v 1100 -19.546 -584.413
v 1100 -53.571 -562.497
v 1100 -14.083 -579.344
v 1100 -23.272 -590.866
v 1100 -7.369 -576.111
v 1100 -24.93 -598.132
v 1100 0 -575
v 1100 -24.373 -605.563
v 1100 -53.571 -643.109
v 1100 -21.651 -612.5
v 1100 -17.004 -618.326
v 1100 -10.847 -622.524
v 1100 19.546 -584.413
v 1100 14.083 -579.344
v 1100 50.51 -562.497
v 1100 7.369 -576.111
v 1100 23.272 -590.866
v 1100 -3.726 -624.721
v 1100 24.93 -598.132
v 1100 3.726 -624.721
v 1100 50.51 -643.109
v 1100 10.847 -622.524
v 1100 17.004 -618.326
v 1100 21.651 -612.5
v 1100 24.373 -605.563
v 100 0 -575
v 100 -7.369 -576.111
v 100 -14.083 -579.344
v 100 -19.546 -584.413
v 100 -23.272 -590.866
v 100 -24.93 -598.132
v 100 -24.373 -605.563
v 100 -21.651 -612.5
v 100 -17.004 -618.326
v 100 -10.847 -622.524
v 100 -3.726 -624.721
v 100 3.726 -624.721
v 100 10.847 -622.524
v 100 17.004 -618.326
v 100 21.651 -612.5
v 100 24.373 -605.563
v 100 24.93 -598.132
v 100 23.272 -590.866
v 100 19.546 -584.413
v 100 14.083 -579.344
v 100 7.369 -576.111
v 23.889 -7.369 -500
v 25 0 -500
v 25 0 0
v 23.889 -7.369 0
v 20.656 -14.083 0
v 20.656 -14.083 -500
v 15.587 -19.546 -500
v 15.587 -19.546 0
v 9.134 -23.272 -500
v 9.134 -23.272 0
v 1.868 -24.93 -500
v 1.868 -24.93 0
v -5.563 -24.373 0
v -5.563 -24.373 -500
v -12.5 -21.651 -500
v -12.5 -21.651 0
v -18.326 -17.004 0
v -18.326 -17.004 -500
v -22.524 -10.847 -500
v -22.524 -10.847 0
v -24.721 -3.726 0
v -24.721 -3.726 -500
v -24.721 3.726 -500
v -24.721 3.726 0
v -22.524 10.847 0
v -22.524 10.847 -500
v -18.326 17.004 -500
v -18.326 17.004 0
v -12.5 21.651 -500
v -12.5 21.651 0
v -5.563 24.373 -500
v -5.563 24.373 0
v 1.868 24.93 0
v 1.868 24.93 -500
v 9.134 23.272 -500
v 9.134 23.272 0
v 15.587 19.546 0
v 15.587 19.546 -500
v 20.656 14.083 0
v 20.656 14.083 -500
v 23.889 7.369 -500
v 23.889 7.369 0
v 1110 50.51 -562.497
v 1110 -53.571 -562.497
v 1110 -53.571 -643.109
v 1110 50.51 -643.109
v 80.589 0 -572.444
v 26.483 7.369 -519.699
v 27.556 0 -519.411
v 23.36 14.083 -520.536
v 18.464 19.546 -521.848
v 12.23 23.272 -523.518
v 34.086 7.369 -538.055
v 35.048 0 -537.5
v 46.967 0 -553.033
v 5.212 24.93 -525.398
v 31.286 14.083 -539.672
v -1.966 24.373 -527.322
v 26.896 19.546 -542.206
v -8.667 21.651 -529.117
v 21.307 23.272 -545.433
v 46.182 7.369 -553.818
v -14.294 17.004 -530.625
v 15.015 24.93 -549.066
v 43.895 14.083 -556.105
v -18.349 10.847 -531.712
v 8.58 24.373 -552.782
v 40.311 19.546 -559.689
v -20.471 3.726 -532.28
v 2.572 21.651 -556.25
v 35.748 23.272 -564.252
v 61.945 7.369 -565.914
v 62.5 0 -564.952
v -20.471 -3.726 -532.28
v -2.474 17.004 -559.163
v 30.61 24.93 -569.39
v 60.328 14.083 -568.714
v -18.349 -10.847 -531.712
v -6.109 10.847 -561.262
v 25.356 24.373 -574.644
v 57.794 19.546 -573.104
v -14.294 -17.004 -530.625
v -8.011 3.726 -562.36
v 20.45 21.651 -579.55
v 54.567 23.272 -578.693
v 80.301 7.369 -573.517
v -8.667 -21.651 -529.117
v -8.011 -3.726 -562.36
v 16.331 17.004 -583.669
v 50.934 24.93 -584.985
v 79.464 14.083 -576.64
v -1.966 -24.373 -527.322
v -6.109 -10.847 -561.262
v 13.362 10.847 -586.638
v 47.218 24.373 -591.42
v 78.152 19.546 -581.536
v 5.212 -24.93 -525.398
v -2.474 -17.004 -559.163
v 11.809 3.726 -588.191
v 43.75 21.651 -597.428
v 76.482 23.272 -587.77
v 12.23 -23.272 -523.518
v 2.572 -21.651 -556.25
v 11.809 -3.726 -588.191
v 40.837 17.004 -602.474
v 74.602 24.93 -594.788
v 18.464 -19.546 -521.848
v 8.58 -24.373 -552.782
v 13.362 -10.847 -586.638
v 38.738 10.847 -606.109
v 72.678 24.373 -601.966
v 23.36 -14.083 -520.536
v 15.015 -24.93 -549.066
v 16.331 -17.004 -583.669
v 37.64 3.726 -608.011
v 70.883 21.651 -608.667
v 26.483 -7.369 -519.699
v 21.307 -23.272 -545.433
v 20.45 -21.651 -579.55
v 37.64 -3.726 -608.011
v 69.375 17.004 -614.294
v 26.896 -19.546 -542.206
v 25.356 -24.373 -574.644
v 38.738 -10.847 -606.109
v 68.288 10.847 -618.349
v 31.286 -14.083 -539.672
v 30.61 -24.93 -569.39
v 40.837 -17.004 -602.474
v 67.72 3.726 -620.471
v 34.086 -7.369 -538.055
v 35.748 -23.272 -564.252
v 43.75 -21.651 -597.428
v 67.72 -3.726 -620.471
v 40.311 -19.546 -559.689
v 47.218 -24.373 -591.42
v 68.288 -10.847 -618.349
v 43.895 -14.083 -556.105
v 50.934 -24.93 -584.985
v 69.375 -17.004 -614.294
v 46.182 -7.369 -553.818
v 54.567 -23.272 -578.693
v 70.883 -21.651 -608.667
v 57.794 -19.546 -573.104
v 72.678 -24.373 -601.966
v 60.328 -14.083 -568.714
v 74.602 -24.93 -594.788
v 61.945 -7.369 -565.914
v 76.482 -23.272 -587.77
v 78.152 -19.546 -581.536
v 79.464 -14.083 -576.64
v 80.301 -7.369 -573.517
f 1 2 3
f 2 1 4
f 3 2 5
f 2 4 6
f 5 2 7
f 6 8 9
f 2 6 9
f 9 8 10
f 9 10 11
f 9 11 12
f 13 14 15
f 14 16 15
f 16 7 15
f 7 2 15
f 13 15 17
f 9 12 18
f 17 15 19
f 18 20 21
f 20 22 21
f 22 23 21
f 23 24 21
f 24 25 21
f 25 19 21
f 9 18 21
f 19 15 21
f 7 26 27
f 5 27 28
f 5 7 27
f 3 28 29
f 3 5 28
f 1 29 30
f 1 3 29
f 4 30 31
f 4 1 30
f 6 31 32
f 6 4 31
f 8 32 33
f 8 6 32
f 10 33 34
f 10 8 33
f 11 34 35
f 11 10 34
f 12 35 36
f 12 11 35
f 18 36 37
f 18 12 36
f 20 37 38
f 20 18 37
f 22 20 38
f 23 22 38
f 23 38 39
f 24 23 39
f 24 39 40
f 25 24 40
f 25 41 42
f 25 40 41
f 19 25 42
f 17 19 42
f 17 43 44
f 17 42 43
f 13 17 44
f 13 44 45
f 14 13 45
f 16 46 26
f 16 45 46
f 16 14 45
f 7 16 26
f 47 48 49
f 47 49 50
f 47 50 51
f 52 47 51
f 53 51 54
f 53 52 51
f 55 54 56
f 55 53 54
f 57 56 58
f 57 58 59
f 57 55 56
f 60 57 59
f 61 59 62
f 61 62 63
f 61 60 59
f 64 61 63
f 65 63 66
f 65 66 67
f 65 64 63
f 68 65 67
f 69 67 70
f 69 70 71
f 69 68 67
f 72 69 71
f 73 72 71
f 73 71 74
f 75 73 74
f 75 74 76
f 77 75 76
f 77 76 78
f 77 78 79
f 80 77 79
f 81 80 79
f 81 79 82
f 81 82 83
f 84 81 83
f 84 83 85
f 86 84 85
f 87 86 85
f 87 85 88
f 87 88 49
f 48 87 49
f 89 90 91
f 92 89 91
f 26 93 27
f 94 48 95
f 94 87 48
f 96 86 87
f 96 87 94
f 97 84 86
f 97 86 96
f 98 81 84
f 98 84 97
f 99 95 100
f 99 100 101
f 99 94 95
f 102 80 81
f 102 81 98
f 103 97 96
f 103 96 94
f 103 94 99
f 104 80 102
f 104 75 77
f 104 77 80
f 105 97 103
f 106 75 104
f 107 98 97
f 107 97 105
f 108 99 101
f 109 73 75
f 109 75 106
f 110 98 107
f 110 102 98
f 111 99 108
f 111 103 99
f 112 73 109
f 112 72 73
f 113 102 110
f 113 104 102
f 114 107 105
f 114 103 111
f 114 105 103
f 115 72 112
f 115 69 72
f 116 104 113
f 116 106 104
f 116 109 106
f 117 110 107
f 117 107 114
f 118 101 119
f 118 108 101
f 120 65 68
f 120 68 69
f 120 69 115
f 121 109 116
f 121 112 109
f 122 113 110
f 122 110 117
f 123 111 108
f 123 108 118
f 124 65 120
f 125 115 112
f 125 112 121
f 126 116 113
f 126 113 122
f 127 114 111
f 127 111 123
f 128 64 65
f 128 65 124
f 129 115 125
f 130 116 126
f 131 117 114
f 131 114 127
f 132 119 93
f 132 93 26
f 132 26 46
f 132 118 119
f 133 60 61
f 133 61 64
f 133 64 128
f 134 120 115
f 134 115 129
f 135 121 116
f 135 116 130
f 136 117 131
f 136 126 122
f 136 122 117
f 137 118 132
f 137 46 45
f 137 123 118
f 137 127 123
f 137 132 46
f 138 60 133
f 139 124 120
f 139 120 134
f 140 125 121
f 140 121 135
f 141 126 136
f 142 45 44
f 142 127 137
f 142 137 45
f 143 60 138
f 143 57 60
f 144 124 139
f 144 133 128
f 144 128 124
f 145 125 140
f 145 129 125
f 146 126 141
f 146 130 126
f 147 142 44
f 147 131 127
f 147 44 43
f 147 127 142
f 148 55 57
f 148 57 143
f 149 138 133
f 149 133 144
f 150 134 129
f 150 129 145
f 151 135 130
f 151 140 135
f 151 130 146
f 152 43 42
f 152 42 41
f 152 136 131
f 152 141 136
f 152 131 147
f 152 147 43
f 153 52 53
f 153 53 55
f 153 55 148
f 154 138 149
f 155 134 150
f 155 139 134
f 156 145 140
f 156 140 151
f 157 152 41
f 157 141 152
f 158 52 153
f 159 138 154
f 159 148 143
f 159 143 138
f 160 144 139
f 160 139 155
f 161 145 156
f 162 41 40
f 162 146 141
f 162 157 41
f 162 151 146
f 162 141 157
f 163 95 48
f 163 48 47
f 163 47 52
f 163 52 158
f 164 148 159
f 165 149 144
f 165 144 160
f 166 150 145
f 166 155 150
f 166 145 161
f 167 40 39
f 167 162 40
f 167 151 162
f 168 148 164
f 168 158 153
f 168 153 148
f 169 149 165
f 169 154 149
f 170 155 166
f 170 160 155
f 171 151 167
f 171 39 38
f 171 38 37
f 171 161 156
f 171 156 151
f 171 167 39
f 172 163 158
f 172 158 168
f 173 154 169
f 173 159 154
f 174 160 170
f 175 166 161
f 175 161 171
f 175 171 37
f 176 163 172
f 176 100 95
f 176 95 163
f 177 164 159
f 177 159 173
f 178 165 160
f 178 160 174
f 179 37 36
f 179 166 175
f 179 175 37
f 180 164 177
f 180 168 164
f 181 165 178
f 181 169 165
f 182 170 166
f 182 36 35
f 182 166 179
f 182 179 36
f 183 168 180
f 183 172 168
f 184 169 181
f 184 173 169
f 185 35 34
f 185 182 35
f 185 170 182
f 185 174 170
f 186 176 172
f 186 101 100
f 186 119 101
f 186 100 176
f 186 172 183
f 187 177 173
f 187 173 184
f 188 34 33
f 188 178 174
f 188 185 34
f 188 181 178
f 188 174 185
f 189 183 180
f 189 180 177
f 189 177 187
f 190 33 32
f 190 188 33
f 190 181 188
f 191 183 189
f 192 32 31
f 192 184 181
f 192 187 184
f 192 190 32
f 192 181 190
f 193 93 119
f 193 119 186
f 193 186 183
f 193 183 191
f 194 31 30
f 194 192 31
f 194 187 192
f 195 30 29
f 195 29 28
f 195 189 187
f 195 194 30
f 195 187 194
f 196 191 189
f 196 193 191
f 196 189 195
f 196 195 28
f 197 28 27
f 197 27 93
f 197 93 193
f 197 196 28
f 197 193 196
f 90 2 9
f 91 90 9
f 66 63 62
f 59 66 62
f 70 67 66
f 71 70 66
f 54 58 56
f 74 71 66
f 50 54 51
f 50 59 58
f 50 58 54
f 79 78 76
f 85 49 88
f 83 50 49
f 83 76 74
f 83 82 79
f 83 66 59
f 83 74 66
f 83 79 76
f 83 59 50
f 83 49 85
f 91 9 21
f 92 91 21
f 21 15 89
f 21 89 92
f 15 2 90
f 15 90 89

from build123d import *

# Parameters (mm, degrees)
SKETCH1_R           = 25
SKETCH4_W           = 80.61138344
SKETCH4_H           = 104.08052039
BOSS_EXTRUDE1_DEPTH = 10


with BuildPart() as part:
    # Sweep1: sweep along a path in Sketch3
    with BuildLine(Plane(origin=(0, 0, 0), x_dir=(1, 0, 0), z_dir=(0, 1, 0))) as sweep1_path:
        Line((0, 0), (0, 500))
        ThreePointArc((0, 500), (29.289321881, 570.710678119), (100, 600))
        Line((100, 600), (1100, 600))
    # Sketch1 → Sweep1 (sweep)
    with BuildSketch(Plane.XY):
        Circle(SKETCH1_R)
    sweep(path=sweep1_path.line)

    # Sketch4 → Boss-Extrude1 (add)
    with BuildSketch(Plane(origin=(1100, 0, 0), x_dir=(0, 0, -1), z_dir=(1, 0, 0))):
        with Locations((602.803020109, -1.530595888)):
            Rectangle(SKETCH4_W, SKETCH4_H)
    extrude(amount=BOSS_EXTRUDE1_DEPTH)


solid = part.part
